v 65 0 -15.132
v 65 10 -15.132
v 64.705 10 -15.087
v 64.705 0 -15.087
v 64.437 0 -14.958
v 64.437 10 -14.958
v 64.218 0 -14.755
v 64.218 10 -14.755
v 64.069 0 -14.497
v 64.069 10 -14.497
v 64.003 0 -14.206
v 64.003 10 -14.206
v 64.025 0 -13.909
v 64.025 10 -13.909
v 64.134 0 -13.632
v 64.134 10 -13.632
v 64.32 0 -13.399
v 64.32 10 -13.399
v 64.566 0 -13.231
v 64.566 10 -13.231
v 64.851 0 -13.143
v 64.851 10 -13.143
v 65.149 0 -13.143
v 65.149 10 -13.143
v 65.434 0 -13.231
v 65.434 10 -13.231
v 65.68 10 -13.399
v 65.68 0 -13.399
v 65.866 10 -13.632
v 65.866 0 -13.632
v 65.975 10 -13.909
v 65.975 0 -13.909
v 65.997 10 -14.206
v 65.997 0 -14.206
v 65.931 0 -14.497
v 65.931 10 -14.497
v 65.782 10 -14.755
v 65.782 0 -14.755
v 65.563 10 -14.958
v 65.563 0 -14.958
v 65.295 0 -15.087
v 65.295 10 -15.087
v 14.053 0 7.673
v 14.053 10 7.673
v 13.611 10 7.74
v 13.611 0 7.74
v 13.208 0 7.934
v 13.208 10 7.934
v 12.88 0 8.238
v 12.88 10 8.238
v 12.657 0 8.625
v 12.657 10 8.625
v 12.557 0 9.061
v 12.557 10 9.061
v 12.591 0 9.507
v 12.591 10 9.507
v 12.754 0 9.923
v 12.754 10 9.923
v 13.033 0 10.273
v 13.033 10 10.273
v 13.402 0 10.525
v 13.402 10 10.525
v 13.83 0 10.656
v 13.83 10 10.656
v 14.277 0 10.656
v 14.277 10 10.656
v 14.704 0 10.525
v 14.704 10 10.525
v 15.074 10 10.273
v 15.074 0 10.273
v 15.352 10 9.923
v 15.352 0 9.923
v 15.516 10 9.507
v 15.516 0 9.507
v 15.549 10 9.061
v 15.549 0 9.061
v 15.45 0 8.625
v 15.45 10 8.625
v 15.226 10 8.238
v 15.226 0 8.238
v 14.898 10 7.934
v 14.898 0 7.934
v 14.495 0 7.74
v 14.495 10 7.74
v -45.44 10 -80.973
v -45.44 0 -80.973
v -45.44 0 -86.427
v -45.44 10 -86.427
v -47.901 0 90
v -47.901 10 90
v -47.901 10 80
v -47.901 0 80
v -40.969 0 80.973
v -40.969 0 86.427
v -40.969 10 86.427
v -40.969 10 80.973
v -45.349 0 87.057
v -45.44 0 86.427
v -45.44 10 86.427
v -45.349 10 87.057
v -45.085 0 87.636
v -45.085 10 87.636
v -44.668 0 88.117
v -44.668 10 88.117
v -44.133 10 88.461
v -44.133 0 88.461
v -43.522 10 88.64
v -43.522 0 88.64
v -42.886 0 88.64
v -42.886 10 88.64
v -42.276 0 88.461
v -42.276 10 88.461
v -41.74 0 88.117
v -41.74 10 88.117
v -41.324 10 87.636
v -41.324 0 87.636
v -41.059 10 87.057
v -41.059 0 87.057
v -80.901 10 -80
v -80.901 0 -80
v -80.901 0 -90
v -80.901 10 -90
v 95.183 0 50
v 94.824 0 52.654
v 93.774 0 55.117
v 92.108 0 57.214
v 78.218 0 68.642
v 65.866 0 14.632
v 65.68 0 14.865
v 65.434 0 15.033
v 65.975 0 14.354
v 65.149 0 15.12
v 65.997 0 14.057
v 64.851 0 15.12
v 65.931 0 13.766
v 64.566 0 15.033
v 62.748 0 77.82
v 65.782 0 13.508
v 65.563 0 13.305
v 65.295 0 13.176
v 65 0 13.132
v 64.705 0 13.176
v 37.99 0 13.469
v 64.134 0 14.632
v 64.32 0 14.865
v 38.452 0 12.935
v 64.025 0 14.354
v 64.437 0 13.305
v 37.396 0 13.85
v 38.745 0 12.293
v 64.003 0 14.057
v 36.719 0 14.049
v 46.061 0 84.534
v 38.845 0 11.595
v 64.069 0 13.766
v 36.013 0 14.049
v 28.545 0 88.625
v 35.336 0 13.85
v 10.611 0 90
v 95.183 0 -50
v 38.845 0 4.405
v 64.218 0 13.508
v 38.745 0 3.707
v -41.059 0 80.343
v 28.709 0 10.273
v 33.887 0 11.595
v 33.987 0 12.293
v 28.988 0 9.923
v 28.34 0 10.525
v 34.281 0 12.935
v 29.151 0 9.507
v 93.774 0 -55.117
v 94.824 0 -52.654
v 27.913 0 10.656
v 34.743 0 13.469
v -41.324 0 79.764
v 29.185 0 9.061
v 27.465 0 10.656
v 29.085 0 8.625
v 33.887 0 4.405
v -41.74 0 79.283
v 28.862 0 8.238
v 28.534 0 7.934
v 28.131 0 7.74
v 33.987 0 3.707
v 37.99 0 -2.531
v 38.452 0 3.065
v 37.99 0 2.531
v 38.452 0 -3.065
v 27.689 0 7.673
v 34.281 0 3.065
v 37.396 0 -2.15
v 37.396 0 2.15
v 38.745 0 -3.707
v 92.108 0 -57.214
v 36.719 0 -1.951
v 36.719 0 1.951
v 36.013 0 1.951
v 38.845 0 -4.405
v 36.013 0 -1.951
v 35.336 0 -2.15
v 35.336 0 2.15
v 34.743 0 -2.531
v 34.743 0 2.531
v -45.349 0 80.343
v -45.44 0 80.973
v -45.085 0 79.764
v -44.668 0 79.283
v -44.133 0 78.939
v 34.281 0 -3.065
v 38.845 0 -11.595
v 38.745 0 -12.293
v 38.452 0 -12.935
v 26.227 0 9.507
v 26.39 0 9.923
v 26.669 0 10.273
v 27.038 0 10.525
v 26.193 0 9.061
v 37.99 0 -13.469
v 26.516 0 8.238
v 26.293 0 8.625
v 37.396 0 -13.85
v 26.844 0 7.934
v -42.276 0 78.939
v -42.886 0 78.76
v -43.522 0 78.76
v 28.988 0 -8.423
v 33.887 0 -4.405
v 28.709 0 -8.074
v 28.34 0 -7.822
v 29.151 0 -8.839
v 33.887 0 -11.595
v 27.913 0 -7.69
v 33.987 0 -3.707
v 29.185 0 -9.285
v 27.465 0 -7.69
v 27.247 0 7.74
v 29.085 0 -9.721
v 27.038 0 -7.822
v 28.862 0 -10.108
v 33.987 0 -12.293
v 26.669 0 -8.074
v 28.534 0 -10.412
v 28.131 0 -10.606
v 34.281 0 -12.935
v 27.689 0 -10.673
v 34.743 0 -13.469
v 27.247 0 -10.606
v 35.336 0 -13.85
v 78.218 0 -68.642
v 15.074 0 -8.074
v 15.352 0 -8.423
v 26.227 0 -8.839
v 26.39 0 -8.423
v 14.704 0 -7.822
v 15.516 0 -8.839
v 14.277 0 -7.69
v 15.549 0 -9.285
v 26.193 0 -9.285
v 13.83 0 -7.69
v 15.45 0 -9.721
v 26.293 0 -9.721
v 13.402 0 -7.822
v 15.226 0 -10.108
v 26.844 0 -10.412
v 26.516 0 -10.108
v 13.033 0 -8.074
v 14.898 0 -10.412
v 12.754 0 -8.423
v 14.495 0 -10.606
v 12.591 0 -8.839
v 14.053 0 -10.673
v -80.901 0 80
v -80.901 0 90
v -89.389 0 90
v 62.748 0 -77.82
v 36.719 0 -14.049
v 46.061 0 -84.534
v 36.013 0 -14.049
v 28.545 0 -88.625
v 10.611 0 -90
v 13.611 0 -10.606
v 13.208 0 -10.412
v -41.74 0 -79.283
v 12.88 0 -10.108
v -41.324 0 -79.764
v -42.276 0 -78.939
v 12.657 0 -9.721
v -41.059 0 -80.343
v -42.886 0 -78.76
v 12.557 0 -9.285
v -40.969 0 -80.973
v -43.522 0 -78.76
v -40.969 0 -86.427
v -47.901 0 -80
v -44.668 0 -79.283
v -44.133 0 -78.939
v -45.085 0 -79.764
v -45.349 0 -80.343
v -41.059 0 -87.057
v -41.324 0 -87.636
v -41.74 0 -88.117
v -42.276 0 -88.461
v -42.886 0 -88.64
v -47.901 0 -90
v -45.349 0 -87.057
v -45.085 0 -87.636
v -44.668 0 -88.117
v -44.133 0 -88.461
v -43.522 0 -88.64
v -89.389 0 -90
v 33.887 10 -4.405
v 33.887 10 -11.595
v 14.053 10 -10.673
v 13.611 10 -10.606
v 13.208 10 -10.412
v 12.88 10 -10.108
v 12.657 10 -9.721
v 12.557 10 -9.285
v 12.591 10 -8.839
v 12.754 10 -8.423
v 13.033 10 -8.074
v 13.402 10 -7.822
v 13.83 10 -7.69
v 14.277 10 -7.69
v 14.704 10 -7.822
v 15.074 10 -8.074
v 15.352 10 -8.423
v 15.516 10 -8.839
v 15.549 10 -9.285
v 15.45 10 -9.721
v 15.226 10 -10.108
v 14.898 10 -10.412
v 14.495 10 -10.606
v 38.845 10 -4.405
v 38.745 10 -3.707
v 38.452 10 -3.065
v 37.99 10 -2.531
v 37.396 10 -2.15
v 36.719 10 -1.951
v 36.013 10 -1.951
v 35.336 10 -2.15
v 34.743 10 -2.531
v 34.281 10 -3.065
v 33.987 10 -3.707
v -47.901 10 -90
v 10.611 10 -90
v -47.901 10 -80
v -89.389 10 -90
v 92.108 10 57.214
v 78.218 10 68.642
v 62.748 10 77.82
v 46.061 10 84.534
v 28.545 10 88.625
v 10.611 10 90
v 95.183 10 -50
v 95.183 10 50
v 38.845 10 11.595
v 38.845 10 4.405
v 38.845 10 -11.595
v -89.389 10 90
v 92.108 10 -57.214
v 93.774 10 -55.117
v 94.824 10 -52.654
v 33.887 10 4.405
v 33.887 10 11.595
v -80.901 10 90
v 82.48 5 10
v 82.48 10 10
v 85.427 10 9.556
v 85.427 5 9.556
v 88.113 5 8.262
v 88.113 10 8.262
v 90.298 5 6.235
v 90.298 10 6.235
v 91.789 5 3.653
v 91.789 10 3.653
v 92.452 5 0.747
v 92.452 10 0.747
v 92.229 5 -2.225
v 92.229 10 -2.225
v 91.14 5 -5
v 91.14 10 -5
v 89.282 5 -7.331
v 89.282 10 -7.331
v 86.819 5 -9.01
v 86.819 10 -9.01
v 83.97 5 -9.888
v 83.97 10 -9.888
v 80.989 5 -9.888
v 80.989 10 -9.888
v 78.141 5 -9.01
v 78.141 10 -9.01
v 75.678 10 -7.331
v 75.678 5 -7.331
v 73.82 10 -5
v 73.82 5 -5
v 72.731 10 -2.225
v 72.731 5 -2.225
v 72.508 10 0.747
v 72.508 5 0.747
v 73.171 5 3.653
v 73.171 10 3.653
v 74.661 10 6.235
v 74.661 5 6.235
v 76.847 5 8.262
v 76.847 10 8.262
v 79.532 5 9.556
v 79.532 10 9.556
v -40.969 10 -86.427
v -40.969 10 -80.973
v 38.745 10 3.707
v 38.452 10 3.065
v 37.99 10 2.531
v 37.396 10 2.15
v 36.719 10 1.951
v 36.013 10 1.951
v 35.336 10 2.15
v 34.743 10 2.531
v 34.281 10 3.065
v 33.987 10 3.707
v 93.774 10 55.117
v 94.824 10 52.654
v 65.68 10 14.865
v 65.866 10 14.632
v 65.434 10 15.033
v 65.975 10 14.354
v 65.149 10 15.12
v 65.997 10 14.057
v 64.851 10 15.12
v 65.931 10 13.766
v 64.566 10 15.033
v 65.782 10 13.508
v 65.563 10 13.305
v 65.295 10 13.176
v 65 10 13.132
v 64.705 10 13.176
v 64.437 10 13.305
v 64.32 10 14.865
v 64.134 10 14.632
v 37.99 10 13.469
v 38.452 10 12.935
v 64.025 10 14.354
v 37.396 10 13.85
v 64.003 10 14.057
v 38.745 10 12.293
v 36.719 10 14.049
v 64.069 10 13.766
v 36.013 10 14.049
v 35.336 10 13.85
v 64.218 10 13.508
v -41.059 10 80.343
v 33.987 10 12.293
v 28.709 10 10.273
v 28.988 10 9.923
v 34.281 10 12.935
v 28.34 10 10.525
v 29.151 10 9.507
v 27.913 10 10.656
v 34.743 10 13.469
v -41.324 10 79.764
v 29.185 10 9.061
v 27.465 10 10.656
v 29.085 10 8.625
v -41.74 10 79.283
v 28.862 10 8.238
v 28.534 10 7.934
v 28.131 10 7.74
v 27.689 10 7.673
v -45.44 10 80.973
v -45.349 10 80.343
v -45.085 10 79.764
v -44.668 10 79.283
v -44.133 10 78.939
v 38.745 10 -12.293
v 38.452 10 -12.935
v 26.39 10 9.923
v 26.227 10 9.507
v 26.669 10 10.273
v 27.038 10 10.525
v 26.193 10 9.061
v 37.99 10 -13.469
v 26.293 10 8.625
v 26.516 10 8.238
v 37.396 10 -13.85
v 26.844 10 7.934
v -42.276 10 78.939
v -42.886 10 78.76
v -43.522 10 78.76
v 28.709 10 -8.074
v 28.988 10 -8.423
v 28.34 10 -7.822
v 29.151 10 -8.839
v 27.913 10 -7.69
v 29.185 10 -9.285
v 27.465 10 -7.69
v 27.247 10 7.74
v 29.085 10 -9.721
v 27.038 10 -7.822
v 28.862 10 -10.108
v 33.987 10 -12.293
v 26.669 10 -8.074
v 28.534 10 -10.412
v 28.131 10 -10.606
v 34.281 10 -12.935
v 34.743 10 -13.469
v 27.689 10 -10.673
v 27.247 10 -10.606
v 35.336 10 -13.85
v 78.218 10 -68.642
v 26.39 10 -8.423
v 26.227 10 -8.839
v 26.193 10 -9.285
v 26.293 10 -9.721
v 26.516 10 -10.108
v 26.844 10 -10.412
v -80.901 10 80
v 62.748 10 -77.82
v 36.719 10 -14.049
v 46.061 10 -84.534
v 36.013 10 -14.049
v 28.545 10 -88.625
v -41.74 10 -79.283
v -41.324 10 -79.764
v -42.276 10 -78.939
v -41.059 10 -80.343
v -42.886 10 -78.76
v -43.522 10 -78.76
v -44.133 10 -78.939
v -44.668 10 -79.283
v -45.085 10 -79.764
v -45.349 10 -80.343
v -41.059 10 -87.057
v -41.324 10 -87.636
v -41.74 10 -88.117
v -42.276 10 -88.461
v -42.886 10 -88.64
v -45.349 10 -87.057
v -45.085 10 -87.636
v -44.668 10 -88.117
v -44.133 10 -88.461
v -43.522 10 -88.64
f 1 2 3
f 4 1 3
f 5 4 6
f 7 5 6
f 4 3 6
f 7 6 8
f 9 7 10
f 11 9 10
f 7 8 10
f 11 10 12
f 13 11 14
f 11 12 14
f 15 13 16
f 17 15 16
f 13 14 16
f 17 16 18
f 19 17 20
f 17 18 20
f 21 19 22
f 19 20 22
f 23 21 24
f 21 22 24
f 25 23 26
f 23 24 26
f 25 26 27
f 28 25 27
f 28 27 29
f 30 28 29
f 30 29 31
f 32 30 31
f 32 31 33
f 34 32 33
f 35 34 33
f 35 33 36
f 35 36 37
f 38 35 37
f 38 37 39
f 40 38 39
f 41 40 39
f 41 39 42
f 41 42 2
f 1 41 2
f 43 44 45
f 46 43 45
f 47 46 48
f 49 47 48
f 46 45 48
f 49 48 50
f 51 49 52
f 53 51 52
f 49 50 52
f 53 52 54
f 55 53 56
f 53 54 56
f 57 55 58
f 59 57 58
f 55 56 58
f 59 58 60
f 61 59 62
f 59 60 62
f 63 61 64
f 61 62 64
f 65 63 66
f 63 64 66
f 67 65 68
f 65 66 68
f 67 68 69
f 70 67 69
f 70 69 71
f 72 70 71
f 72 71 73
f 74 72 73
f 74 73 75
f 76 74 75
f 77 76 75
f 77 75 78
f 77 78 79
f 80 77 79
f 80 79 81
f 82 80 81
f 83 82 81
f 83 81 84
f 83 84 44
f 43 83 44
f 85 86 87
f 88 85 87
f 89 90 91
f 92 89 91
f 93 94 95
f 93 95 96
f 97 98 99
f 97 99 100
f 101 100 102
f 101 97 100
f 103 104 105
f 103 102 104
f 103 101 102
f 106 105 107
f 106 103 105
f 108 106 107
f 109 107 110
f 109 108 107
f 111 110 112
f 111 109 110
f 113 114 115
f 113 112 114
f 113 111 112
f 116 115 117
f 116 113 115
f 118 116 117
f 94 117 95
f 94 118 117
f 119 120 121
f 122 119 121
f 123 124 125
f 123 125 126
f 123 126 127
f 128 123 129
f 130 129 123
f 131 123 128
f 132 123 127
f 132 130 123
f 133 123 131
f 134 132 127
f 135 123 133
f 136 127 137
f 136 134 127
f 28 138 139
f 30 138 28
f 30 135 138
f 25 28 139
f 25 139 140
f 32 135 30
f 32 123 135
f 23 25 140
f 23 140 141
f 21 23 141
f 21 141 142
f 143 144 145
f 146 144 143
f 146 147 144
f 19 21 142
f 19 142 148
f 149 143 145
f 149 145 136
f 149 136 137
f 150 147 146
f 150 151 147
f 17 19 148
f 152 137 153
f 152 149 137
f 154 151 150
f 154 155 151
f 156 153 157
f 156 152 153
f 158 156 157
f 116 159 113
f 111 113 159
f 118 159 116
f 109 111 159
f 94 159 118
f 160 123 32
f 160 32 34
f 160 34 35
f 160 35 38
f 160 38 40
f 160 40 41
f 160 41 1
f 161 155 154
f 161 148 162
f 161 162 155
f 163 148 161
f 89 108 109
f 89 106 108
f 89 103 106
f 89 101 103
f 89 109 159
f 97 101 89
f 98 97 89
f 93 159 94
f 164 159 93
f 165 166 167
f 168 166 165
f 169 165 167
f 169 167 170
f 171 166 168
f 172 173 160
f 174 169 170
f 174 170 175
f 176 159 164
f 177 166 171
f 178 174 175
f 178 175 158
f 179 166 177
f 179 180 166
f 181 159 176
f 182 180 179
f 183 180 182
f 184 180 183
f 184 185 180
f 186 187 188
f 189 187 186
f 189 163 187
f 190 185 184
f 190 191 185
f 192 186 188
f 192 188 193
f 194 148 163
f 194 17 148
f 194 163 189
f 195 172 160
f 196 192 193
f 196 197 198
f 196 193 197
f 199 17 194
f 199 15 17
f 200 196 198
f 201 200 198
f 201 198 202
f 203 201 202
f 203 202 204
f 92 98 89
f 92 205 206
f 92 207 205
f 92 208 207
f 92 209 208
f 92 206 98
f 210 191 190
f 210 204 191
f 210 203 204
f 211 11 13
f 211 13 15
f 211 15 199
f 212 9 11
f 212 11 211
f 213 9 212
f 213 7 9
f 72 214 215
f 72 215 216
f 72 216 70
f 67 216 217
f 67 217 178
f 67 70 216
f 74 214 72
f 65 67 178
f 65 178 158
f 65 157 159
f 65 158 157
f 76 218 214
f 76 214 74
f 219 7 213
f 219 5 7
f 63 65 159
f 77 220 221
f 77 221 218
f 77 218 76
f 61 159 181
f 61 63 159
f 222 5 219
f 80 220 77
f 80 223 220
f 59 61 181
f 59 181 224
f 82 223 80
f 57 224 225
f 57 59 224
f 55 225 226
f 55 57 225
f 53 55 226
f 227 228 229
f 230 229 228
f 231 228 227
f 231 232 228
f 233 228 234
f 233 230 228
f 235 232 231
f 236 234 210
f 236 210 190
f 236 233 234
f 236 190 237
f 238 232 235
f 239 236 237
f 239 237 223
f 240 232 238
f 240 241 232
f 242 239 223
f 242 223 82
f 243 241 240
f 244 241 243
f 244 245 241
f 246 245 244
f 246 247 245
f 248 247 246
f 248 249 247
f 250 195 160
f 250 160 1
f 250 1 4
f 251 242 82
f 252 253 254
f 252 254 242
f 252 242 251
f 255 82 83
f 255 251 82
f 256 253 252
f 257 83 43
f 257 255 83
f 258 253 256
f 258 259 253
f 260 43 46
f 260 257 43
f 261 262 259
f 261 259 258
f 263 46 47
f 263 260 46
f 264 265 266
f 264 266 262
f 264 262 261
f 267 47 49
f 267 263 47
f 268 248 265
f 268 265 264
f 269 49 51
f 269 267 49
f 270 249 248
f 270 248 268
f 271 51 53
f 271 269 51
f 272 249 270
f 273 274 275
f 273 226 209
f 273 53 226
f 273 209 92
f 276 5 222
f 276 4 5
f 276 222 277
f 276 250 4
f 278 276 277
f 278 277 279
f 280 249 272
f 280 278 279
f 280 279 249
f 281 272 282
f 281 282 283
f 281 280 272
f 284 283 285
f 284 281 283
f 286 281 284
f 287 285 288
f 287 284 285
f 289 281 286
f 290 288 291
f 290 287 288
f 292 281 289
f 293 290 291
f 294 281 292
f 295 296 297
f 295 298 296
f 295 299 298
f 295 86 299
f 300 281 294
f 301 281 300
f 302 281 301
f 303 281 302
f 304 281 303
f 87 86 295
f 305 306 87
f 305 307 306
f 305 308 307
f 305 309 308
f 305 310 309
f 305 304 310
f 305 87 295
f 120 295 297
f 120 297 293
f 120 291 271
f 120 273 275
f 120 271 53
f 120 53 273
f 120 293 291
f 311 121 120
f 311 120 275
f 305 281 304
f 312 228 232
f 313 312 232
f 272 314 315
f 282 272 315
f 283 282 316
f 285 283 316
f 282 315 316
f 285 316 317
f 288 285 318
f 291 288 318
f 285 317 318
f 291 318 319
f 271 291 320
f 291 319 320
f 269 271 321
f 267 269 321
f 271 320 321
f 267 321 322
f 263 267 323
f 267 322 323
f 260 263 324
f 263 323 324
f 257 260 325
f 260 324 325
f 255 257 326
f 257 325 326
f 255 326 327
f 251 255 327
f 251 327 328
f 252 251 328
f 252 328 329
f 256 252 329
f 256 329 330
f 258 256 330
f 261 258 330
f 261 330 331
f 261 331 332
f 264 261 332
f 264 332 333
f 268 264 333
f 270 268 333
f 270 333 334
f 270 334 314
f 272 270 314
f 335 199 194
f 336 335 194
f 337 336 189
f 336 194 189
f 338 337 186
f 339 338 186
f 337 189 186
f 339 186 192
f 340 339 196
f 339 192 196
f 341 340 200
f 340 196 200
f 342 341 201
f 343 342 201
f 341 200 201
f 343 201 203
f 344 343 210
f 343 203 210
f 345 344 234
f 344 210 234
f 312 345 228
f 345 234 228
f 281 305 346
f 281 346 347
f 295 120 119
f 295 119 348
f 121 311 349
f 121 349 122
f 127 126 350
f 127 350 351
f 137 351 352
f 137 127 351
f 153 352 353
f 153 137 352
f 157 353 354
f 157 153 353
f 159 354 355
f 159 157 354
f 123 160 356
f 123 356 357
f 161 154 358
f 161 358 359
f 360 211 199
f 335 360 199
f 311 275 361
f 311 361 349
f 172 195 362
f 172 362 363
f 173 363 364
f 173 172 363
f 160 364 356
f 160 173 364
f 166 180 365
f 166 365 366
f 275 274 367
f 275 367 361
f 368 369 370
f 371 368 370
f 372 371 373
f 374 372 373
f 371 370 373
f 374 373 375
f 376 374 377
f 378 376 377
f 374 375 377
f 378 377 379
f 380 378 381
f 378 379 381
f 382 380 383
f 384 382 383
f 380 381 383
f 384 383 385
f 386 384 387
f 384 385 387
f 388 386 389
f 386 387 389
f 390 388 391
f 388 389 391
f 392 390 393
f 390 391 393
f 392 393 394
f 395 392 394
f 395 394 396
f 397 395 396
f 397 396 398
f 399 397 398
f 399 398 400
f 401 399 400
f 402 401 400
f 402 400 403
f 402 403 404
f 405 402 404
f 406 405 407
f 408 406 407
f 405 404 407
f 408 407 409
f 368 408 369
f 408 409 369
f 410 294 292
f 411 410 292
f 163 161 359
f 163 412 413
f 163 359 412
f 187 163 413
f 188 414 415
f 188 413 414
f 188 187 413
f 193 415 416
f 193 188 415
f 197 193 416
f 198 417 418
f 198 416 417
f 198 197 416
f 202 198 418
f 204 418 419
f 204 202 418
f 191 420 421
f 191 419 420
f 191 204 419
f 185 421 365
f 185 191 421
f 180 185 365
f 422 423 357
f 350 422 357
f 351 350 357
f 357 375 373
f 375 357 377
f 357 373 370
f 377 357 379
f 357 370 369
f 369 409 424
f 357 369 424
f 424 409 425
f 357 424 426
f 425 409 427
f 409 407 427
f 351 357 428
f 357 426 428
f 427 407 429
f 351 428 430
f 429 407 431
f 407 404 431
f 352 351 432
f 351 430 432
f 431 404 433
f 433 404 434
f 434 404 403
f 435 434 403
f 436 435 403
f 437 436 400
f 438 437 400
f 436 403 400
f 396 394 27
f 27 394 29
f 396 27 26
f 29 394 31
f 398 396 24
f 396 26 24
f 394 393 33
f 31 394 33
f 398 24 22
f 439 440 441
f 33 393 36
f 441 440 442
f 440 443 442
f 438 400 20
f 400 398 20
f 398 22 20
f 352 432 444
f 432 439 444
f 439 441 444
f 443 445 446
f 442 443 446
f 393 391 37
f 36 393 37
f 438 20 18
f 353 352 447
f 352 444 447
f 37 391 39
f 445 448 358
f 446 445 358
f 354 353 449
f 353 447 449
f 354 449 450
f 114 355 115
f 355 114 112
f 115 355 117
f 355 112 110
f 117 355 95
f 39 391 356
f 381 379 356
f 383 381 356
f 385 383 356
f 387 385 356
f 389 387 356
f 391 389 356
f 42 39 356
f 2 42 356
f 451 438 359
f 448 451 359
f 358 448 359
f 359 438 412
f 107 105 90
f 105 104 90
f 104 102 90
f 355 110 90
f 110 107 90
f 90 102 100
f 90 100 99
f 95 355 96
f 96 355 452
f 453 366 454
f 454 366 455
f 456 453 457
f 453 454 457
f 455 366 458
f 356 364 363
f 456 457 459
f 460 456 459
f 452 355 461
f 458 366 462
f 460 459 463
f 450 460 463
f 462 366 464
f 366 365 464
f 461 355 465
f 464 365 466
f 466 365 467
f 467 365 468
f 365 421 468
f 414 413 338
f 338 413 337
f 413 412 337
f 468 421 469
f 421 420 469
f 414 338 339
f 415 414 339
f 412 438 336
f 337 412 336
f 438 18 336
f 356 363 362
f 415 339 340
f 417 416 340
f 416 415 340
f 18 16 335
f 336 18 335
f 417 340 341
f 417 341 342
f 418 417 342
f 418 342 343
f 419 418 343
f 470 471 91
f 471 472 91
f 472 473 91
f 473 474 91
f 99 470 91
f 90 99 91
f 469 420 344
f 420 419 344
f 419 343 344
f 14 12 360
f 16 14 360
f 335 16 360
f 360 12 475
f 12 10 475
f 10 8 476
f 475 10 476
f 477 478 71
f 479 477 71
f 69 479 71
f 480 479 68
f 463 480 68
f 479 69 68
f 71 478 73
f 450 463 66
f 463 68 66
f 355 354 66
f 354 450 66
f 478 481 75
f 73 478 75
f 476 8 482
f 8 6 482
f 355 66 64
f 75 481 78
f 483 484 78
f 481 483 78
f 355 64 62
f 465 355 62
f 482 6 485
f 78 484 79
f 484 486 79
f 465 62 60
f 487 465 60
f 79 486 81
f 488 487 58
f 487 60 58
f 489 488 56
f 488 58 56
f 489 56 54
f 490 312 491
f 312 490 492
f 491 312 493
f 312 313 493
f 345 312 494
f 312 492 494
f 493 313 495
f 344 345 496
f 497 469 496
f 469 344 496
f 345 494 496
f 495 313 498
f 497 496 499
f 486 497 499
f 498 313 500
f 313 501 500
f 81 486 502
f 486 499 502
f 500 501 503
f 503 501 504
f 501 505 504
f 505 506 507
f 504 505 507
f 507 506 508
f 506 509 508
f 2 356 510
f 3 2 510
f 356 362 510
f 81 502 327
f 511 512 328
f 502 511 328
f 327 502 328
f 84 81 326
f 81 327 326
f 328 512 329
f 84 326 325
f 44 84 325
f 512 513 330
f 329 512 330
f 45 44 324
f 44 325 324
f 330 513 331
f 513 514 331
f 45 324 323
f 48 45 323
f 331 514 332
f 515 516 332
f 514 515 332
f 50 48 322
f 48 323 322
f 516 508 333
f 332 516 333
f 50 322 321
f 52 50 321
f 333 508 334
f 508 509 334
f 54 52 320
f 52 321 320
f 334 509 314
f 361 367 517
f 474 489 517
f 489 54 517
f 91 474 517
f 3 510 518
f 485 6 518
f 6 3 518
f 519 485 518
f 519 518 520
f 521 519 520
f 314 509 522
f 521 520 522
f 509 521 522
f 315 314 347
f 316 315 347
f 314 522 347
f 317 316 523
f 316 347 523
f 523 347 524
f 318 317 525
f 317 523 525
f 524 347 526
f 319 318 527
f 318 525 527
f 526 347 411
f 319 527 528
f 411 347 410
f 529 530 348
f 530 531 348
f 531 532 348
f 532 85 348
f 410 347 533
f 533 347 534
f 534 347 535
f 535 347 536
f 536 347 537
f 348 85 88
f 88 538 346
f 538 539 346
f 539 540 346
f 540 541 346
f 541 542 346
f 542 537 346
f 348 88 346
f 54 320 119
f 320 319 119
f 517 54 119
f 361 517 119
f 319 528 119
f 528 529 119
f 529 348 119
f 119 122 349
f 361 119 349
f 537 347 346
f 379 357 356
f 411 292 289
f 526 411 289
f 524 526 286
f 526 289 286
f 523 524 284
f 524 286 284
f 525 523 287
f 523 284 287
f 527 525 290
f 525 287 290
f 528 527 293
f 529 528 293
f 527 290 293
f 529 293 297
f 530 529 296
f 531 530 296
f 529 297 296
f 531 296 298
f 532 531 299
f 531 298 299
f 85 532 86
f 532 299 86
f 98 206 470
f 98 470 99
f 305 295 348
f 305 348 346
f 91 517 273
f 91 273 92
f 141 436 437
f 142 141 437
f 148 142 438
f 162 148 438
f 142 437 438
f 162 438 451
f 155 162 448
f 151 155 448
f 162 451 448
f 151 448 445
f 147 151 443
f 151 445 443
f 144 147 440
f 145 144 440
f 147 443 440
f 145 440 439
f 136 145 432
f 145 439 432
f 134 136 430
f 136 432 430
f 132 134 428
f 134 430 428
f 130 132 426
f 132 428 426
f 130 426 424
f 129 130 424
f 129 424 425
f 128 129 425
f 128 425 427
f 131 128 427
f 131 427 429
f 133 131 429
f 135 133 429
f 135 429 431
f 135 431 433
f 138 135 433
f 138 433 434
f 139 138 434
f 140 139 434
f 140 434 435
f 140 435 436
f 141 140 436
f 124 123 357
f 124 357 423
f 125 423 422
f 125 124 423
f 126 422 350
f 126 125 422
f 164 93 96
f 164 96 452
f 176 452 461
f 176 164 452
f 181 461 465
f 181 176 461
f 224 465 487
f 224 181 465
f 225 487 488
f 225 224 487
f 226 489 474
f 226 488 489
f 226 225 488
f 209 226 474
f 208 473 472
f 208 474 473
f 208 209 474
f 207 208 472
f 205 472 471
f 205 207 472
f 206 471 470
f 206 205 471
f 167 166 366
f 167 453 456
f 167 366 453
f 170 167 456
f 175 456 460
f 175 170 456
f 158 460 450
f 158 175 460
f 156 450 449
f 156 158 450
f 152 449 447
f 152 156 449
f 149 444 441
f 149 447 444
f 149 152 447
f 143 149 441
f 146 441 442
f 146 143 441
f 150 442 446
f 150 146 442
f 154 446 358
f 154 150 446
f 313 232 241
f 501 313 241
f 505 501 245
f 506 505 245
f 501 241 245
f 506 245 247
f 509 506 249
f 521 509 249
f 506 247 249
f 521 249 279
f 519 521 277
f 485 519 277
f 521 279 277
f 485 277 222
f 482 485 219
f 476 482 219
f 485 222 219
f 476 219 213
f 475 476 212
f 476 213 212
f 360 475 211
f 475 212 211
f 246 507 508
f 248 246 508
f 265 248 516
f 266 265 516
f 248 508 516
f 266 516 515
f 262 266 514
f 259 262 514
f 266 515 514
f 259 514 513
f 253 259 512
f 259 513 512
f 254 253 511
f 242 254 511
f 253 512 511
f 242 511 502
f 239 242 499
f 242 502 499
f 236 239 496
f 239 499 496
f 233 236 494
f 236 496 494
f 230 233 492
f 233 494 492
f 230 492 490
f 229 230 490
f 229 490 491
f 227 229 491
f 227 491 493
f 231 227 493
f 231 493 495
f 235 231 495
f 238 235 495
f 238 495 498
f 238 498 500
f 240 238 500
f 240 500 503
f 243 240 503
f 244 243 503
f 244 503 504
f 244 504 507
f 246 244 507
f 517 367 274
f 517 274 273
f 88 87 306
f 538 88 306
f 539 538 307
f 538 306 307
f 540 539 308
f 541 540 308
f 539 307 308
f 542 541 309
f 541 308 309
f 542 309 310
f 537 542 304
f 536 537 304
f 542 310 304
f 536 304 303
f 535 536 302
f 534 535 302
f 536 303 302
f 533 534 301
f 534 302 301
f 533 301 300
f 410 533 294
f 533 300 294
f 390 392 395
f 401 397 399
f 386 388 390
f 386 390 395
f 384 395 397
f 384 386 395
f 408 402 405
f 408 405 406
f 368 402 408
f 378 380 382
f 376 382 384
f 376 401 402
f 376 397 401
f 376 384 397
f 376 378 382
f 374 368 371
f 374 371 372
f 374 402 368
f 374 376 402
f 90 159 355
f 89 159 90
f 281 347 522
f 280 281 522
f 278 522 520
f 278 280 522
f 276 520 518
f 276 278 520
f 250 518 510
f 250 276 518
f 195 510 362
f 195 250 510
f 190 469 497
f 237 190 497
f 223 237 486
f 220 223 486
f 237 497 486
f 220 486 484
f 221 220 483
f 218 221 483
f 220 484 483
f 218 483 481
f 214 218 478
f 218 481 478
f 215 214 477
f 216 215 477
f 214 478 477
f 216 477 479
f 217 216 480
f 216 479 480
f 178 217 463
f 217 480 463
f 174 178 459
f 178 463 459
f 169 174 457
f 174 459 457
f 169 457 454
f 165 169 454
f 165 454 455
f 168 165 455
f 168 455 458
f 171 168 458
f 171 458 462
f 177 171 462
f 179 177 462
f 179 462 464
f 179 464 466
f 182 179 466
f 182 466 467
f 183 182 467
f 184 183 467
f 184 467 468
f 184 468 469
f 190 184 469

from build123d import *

# Parameters (mm, degrees)
BOSS_EXTRUDE1_DEPTH = 10
SKETCH2_R           = 1
SKETCH2_R_2         = 1.5
SKETCH2_W           = 33
SKETCH2_H           = 10
CUT_EXTRUDE2_DEPTH  = 15
SKETCH3_R           = 10
CUT_EXTRUDE3_DEPTH  = 5


with BuildPart() as part:
    # Sketch1 → Boss-Extrude1 (new body)
    with BuildSketch(Plane(origin=(0, 0, 0), x_dir=(1, 0, 0), z_dir=(0, 1, 0))):
        with BuildLine():
            Line((-89.389143795, -90), (-89.389143795, 90))
            Line((-89.389143795, 90), (10.610856205, 90))
            ThreePointArc((10.610856205, 90), (54.533138364, 81.496268076), (92.107774725, 57.214031174))
            ThreePointArc((92.107774725, 57.214031174), (94.381847518, 53.920998768), (95.182620993, 50))
            Line((95.182620993, 50), (95.182620993, -50))
            ThreePointArc((95.182620993, -50), (94.381847518, -53.920998768), (92.107774725, -57.214031174))
            ThreePointArc((92.107774725, -57.214031174), (54.533138364, -81.496268076), (10.610856205, -90))
            Line((10.610856205, -90), (-89.389143795, -90))
        make_face()
    extrude(amount=BOSS_EXTRUDE1_DEPTH)

    # Sketch2 → Cut-Extrude2 (cut, symmetric)
    with BuildSketch(Plane(origin=(0, 10, 0), x_dir=(1, 0, 0), z_dir=(0, 1, 0))):
        with Locations(Location((65, 14.131573434, 0), (0, 0, 90))):
            Circle(SKETCH2_R)
        with Locations(Location((27.688972694, 9.173126615, 0), (0, 0, 90))):
            Circle(SKETCH2_R_2)
        with Locations(Location((14.053243942, 9.173126615, 0), (0, 0, 90))):
            Circle(SKETCH2_R_2)
        with Locations(Location((14.053243942, -9.173126615, 0), (0, 0, 90))):
            Circle(SKETCH2_R_2)
        with Locations(Location((27.688972694, -9.173126615, 0), (0, 0, 90))):
            Circle(SKETCH2_R_2)
        with Locations(Location((65, -14.131573434, 0), (0, 0, 90))):
            Circle(SKETCH2_R)
        with BuildLine():
            Line((-40.968894473, 86.42714575), (-40.968894473, 80.97285425))
            ThreePointArc((-40.968894473, 80.97285425), (-43.204350858, 78.737397865), (-45.439807243, 80.97285425))
            Line((-45.439807243, 80.97285425), (-45.439807243, 86.42714575))
            ThreePointArc((-45.439807243, 86.42714575), (-43.204350858, 88.662602135), (-40.968894473, 86.42714575))
        make_face()
        with BuildLine():
            Line((38.845478036, 11.594873944), (38.845478036, 4.405126056))
            ThreePointArc((38.845478036, 4.405126056), (36.366254627, 1.925902647), (33.887031217, 4.405126056))
            Line((33.887031217, 4.405126056), (33.887031217, 11.594873944))
            ThreePointArc((33.887031217, 11.594873944), (36.366254627, 14.074097353), (38.845478036, 11.594873944))
        make_face()
        with Locations((-64.401012641, 85)):
            Rectangle(SKETCH2_W, SKETCH2_H)
        with BuildLine():
            Line((38.845478036, -11.594873944), (38.845478036, -4.405126056))
            ThreePointArc((38.845478036, -4.405126056), (36.366254627, -1.925902647), (33.887031217, -4.405126056))
            Line((33.887031217, -4.405126056), (33.887031217, -11.594873944))
            ThreePointArc((33.887031217, -11.594873944), (36.366254627, -14.074097353), (38.845478036, -11.594873944))
        make_face()
        with BuildLine():
            Line((-40.968894473, -86.42714575), (-40.968894473, -80.97285425))
            ThreePointArc((-40.968894473, -80.97285425), (-43.204350858, -78.737397865), (-45.439807243, -80.97285425))
            Line((-45.439807243, -80.97285425), (-45.439807243, -86.42714575))
            ThreePointArc((-45.439807243, -86.42714575), (-43.204350858, -88.662602135), (-40.968894473, -86.42714575))
        make_face()
        with Locations((-64.401012641, -85)):
            Rectangle(SKETCH2_W, SKETCH2_H)
    extrude(amount=CUT_EXTRUDE2_DEPTH, both=True, mode=Mode.SUBTRACT)

    # Sketch3 → Cut-Extrude3 (cut, symmetric)
    with BuildSketch(Plane(origin=(0, 10, 0), x_dir=(1, 0, 0), z_dir=(0, 1, 0))):
        with Locations(Location((82.479810043, 0, 0), (0, 0, 270))):
            Circle(SKETCH3_R)
    extrude(amount=CUT_EXTRUDE3_DEPTH, both=True, mode=Mode.SUBTRACT)


solid = part.part
